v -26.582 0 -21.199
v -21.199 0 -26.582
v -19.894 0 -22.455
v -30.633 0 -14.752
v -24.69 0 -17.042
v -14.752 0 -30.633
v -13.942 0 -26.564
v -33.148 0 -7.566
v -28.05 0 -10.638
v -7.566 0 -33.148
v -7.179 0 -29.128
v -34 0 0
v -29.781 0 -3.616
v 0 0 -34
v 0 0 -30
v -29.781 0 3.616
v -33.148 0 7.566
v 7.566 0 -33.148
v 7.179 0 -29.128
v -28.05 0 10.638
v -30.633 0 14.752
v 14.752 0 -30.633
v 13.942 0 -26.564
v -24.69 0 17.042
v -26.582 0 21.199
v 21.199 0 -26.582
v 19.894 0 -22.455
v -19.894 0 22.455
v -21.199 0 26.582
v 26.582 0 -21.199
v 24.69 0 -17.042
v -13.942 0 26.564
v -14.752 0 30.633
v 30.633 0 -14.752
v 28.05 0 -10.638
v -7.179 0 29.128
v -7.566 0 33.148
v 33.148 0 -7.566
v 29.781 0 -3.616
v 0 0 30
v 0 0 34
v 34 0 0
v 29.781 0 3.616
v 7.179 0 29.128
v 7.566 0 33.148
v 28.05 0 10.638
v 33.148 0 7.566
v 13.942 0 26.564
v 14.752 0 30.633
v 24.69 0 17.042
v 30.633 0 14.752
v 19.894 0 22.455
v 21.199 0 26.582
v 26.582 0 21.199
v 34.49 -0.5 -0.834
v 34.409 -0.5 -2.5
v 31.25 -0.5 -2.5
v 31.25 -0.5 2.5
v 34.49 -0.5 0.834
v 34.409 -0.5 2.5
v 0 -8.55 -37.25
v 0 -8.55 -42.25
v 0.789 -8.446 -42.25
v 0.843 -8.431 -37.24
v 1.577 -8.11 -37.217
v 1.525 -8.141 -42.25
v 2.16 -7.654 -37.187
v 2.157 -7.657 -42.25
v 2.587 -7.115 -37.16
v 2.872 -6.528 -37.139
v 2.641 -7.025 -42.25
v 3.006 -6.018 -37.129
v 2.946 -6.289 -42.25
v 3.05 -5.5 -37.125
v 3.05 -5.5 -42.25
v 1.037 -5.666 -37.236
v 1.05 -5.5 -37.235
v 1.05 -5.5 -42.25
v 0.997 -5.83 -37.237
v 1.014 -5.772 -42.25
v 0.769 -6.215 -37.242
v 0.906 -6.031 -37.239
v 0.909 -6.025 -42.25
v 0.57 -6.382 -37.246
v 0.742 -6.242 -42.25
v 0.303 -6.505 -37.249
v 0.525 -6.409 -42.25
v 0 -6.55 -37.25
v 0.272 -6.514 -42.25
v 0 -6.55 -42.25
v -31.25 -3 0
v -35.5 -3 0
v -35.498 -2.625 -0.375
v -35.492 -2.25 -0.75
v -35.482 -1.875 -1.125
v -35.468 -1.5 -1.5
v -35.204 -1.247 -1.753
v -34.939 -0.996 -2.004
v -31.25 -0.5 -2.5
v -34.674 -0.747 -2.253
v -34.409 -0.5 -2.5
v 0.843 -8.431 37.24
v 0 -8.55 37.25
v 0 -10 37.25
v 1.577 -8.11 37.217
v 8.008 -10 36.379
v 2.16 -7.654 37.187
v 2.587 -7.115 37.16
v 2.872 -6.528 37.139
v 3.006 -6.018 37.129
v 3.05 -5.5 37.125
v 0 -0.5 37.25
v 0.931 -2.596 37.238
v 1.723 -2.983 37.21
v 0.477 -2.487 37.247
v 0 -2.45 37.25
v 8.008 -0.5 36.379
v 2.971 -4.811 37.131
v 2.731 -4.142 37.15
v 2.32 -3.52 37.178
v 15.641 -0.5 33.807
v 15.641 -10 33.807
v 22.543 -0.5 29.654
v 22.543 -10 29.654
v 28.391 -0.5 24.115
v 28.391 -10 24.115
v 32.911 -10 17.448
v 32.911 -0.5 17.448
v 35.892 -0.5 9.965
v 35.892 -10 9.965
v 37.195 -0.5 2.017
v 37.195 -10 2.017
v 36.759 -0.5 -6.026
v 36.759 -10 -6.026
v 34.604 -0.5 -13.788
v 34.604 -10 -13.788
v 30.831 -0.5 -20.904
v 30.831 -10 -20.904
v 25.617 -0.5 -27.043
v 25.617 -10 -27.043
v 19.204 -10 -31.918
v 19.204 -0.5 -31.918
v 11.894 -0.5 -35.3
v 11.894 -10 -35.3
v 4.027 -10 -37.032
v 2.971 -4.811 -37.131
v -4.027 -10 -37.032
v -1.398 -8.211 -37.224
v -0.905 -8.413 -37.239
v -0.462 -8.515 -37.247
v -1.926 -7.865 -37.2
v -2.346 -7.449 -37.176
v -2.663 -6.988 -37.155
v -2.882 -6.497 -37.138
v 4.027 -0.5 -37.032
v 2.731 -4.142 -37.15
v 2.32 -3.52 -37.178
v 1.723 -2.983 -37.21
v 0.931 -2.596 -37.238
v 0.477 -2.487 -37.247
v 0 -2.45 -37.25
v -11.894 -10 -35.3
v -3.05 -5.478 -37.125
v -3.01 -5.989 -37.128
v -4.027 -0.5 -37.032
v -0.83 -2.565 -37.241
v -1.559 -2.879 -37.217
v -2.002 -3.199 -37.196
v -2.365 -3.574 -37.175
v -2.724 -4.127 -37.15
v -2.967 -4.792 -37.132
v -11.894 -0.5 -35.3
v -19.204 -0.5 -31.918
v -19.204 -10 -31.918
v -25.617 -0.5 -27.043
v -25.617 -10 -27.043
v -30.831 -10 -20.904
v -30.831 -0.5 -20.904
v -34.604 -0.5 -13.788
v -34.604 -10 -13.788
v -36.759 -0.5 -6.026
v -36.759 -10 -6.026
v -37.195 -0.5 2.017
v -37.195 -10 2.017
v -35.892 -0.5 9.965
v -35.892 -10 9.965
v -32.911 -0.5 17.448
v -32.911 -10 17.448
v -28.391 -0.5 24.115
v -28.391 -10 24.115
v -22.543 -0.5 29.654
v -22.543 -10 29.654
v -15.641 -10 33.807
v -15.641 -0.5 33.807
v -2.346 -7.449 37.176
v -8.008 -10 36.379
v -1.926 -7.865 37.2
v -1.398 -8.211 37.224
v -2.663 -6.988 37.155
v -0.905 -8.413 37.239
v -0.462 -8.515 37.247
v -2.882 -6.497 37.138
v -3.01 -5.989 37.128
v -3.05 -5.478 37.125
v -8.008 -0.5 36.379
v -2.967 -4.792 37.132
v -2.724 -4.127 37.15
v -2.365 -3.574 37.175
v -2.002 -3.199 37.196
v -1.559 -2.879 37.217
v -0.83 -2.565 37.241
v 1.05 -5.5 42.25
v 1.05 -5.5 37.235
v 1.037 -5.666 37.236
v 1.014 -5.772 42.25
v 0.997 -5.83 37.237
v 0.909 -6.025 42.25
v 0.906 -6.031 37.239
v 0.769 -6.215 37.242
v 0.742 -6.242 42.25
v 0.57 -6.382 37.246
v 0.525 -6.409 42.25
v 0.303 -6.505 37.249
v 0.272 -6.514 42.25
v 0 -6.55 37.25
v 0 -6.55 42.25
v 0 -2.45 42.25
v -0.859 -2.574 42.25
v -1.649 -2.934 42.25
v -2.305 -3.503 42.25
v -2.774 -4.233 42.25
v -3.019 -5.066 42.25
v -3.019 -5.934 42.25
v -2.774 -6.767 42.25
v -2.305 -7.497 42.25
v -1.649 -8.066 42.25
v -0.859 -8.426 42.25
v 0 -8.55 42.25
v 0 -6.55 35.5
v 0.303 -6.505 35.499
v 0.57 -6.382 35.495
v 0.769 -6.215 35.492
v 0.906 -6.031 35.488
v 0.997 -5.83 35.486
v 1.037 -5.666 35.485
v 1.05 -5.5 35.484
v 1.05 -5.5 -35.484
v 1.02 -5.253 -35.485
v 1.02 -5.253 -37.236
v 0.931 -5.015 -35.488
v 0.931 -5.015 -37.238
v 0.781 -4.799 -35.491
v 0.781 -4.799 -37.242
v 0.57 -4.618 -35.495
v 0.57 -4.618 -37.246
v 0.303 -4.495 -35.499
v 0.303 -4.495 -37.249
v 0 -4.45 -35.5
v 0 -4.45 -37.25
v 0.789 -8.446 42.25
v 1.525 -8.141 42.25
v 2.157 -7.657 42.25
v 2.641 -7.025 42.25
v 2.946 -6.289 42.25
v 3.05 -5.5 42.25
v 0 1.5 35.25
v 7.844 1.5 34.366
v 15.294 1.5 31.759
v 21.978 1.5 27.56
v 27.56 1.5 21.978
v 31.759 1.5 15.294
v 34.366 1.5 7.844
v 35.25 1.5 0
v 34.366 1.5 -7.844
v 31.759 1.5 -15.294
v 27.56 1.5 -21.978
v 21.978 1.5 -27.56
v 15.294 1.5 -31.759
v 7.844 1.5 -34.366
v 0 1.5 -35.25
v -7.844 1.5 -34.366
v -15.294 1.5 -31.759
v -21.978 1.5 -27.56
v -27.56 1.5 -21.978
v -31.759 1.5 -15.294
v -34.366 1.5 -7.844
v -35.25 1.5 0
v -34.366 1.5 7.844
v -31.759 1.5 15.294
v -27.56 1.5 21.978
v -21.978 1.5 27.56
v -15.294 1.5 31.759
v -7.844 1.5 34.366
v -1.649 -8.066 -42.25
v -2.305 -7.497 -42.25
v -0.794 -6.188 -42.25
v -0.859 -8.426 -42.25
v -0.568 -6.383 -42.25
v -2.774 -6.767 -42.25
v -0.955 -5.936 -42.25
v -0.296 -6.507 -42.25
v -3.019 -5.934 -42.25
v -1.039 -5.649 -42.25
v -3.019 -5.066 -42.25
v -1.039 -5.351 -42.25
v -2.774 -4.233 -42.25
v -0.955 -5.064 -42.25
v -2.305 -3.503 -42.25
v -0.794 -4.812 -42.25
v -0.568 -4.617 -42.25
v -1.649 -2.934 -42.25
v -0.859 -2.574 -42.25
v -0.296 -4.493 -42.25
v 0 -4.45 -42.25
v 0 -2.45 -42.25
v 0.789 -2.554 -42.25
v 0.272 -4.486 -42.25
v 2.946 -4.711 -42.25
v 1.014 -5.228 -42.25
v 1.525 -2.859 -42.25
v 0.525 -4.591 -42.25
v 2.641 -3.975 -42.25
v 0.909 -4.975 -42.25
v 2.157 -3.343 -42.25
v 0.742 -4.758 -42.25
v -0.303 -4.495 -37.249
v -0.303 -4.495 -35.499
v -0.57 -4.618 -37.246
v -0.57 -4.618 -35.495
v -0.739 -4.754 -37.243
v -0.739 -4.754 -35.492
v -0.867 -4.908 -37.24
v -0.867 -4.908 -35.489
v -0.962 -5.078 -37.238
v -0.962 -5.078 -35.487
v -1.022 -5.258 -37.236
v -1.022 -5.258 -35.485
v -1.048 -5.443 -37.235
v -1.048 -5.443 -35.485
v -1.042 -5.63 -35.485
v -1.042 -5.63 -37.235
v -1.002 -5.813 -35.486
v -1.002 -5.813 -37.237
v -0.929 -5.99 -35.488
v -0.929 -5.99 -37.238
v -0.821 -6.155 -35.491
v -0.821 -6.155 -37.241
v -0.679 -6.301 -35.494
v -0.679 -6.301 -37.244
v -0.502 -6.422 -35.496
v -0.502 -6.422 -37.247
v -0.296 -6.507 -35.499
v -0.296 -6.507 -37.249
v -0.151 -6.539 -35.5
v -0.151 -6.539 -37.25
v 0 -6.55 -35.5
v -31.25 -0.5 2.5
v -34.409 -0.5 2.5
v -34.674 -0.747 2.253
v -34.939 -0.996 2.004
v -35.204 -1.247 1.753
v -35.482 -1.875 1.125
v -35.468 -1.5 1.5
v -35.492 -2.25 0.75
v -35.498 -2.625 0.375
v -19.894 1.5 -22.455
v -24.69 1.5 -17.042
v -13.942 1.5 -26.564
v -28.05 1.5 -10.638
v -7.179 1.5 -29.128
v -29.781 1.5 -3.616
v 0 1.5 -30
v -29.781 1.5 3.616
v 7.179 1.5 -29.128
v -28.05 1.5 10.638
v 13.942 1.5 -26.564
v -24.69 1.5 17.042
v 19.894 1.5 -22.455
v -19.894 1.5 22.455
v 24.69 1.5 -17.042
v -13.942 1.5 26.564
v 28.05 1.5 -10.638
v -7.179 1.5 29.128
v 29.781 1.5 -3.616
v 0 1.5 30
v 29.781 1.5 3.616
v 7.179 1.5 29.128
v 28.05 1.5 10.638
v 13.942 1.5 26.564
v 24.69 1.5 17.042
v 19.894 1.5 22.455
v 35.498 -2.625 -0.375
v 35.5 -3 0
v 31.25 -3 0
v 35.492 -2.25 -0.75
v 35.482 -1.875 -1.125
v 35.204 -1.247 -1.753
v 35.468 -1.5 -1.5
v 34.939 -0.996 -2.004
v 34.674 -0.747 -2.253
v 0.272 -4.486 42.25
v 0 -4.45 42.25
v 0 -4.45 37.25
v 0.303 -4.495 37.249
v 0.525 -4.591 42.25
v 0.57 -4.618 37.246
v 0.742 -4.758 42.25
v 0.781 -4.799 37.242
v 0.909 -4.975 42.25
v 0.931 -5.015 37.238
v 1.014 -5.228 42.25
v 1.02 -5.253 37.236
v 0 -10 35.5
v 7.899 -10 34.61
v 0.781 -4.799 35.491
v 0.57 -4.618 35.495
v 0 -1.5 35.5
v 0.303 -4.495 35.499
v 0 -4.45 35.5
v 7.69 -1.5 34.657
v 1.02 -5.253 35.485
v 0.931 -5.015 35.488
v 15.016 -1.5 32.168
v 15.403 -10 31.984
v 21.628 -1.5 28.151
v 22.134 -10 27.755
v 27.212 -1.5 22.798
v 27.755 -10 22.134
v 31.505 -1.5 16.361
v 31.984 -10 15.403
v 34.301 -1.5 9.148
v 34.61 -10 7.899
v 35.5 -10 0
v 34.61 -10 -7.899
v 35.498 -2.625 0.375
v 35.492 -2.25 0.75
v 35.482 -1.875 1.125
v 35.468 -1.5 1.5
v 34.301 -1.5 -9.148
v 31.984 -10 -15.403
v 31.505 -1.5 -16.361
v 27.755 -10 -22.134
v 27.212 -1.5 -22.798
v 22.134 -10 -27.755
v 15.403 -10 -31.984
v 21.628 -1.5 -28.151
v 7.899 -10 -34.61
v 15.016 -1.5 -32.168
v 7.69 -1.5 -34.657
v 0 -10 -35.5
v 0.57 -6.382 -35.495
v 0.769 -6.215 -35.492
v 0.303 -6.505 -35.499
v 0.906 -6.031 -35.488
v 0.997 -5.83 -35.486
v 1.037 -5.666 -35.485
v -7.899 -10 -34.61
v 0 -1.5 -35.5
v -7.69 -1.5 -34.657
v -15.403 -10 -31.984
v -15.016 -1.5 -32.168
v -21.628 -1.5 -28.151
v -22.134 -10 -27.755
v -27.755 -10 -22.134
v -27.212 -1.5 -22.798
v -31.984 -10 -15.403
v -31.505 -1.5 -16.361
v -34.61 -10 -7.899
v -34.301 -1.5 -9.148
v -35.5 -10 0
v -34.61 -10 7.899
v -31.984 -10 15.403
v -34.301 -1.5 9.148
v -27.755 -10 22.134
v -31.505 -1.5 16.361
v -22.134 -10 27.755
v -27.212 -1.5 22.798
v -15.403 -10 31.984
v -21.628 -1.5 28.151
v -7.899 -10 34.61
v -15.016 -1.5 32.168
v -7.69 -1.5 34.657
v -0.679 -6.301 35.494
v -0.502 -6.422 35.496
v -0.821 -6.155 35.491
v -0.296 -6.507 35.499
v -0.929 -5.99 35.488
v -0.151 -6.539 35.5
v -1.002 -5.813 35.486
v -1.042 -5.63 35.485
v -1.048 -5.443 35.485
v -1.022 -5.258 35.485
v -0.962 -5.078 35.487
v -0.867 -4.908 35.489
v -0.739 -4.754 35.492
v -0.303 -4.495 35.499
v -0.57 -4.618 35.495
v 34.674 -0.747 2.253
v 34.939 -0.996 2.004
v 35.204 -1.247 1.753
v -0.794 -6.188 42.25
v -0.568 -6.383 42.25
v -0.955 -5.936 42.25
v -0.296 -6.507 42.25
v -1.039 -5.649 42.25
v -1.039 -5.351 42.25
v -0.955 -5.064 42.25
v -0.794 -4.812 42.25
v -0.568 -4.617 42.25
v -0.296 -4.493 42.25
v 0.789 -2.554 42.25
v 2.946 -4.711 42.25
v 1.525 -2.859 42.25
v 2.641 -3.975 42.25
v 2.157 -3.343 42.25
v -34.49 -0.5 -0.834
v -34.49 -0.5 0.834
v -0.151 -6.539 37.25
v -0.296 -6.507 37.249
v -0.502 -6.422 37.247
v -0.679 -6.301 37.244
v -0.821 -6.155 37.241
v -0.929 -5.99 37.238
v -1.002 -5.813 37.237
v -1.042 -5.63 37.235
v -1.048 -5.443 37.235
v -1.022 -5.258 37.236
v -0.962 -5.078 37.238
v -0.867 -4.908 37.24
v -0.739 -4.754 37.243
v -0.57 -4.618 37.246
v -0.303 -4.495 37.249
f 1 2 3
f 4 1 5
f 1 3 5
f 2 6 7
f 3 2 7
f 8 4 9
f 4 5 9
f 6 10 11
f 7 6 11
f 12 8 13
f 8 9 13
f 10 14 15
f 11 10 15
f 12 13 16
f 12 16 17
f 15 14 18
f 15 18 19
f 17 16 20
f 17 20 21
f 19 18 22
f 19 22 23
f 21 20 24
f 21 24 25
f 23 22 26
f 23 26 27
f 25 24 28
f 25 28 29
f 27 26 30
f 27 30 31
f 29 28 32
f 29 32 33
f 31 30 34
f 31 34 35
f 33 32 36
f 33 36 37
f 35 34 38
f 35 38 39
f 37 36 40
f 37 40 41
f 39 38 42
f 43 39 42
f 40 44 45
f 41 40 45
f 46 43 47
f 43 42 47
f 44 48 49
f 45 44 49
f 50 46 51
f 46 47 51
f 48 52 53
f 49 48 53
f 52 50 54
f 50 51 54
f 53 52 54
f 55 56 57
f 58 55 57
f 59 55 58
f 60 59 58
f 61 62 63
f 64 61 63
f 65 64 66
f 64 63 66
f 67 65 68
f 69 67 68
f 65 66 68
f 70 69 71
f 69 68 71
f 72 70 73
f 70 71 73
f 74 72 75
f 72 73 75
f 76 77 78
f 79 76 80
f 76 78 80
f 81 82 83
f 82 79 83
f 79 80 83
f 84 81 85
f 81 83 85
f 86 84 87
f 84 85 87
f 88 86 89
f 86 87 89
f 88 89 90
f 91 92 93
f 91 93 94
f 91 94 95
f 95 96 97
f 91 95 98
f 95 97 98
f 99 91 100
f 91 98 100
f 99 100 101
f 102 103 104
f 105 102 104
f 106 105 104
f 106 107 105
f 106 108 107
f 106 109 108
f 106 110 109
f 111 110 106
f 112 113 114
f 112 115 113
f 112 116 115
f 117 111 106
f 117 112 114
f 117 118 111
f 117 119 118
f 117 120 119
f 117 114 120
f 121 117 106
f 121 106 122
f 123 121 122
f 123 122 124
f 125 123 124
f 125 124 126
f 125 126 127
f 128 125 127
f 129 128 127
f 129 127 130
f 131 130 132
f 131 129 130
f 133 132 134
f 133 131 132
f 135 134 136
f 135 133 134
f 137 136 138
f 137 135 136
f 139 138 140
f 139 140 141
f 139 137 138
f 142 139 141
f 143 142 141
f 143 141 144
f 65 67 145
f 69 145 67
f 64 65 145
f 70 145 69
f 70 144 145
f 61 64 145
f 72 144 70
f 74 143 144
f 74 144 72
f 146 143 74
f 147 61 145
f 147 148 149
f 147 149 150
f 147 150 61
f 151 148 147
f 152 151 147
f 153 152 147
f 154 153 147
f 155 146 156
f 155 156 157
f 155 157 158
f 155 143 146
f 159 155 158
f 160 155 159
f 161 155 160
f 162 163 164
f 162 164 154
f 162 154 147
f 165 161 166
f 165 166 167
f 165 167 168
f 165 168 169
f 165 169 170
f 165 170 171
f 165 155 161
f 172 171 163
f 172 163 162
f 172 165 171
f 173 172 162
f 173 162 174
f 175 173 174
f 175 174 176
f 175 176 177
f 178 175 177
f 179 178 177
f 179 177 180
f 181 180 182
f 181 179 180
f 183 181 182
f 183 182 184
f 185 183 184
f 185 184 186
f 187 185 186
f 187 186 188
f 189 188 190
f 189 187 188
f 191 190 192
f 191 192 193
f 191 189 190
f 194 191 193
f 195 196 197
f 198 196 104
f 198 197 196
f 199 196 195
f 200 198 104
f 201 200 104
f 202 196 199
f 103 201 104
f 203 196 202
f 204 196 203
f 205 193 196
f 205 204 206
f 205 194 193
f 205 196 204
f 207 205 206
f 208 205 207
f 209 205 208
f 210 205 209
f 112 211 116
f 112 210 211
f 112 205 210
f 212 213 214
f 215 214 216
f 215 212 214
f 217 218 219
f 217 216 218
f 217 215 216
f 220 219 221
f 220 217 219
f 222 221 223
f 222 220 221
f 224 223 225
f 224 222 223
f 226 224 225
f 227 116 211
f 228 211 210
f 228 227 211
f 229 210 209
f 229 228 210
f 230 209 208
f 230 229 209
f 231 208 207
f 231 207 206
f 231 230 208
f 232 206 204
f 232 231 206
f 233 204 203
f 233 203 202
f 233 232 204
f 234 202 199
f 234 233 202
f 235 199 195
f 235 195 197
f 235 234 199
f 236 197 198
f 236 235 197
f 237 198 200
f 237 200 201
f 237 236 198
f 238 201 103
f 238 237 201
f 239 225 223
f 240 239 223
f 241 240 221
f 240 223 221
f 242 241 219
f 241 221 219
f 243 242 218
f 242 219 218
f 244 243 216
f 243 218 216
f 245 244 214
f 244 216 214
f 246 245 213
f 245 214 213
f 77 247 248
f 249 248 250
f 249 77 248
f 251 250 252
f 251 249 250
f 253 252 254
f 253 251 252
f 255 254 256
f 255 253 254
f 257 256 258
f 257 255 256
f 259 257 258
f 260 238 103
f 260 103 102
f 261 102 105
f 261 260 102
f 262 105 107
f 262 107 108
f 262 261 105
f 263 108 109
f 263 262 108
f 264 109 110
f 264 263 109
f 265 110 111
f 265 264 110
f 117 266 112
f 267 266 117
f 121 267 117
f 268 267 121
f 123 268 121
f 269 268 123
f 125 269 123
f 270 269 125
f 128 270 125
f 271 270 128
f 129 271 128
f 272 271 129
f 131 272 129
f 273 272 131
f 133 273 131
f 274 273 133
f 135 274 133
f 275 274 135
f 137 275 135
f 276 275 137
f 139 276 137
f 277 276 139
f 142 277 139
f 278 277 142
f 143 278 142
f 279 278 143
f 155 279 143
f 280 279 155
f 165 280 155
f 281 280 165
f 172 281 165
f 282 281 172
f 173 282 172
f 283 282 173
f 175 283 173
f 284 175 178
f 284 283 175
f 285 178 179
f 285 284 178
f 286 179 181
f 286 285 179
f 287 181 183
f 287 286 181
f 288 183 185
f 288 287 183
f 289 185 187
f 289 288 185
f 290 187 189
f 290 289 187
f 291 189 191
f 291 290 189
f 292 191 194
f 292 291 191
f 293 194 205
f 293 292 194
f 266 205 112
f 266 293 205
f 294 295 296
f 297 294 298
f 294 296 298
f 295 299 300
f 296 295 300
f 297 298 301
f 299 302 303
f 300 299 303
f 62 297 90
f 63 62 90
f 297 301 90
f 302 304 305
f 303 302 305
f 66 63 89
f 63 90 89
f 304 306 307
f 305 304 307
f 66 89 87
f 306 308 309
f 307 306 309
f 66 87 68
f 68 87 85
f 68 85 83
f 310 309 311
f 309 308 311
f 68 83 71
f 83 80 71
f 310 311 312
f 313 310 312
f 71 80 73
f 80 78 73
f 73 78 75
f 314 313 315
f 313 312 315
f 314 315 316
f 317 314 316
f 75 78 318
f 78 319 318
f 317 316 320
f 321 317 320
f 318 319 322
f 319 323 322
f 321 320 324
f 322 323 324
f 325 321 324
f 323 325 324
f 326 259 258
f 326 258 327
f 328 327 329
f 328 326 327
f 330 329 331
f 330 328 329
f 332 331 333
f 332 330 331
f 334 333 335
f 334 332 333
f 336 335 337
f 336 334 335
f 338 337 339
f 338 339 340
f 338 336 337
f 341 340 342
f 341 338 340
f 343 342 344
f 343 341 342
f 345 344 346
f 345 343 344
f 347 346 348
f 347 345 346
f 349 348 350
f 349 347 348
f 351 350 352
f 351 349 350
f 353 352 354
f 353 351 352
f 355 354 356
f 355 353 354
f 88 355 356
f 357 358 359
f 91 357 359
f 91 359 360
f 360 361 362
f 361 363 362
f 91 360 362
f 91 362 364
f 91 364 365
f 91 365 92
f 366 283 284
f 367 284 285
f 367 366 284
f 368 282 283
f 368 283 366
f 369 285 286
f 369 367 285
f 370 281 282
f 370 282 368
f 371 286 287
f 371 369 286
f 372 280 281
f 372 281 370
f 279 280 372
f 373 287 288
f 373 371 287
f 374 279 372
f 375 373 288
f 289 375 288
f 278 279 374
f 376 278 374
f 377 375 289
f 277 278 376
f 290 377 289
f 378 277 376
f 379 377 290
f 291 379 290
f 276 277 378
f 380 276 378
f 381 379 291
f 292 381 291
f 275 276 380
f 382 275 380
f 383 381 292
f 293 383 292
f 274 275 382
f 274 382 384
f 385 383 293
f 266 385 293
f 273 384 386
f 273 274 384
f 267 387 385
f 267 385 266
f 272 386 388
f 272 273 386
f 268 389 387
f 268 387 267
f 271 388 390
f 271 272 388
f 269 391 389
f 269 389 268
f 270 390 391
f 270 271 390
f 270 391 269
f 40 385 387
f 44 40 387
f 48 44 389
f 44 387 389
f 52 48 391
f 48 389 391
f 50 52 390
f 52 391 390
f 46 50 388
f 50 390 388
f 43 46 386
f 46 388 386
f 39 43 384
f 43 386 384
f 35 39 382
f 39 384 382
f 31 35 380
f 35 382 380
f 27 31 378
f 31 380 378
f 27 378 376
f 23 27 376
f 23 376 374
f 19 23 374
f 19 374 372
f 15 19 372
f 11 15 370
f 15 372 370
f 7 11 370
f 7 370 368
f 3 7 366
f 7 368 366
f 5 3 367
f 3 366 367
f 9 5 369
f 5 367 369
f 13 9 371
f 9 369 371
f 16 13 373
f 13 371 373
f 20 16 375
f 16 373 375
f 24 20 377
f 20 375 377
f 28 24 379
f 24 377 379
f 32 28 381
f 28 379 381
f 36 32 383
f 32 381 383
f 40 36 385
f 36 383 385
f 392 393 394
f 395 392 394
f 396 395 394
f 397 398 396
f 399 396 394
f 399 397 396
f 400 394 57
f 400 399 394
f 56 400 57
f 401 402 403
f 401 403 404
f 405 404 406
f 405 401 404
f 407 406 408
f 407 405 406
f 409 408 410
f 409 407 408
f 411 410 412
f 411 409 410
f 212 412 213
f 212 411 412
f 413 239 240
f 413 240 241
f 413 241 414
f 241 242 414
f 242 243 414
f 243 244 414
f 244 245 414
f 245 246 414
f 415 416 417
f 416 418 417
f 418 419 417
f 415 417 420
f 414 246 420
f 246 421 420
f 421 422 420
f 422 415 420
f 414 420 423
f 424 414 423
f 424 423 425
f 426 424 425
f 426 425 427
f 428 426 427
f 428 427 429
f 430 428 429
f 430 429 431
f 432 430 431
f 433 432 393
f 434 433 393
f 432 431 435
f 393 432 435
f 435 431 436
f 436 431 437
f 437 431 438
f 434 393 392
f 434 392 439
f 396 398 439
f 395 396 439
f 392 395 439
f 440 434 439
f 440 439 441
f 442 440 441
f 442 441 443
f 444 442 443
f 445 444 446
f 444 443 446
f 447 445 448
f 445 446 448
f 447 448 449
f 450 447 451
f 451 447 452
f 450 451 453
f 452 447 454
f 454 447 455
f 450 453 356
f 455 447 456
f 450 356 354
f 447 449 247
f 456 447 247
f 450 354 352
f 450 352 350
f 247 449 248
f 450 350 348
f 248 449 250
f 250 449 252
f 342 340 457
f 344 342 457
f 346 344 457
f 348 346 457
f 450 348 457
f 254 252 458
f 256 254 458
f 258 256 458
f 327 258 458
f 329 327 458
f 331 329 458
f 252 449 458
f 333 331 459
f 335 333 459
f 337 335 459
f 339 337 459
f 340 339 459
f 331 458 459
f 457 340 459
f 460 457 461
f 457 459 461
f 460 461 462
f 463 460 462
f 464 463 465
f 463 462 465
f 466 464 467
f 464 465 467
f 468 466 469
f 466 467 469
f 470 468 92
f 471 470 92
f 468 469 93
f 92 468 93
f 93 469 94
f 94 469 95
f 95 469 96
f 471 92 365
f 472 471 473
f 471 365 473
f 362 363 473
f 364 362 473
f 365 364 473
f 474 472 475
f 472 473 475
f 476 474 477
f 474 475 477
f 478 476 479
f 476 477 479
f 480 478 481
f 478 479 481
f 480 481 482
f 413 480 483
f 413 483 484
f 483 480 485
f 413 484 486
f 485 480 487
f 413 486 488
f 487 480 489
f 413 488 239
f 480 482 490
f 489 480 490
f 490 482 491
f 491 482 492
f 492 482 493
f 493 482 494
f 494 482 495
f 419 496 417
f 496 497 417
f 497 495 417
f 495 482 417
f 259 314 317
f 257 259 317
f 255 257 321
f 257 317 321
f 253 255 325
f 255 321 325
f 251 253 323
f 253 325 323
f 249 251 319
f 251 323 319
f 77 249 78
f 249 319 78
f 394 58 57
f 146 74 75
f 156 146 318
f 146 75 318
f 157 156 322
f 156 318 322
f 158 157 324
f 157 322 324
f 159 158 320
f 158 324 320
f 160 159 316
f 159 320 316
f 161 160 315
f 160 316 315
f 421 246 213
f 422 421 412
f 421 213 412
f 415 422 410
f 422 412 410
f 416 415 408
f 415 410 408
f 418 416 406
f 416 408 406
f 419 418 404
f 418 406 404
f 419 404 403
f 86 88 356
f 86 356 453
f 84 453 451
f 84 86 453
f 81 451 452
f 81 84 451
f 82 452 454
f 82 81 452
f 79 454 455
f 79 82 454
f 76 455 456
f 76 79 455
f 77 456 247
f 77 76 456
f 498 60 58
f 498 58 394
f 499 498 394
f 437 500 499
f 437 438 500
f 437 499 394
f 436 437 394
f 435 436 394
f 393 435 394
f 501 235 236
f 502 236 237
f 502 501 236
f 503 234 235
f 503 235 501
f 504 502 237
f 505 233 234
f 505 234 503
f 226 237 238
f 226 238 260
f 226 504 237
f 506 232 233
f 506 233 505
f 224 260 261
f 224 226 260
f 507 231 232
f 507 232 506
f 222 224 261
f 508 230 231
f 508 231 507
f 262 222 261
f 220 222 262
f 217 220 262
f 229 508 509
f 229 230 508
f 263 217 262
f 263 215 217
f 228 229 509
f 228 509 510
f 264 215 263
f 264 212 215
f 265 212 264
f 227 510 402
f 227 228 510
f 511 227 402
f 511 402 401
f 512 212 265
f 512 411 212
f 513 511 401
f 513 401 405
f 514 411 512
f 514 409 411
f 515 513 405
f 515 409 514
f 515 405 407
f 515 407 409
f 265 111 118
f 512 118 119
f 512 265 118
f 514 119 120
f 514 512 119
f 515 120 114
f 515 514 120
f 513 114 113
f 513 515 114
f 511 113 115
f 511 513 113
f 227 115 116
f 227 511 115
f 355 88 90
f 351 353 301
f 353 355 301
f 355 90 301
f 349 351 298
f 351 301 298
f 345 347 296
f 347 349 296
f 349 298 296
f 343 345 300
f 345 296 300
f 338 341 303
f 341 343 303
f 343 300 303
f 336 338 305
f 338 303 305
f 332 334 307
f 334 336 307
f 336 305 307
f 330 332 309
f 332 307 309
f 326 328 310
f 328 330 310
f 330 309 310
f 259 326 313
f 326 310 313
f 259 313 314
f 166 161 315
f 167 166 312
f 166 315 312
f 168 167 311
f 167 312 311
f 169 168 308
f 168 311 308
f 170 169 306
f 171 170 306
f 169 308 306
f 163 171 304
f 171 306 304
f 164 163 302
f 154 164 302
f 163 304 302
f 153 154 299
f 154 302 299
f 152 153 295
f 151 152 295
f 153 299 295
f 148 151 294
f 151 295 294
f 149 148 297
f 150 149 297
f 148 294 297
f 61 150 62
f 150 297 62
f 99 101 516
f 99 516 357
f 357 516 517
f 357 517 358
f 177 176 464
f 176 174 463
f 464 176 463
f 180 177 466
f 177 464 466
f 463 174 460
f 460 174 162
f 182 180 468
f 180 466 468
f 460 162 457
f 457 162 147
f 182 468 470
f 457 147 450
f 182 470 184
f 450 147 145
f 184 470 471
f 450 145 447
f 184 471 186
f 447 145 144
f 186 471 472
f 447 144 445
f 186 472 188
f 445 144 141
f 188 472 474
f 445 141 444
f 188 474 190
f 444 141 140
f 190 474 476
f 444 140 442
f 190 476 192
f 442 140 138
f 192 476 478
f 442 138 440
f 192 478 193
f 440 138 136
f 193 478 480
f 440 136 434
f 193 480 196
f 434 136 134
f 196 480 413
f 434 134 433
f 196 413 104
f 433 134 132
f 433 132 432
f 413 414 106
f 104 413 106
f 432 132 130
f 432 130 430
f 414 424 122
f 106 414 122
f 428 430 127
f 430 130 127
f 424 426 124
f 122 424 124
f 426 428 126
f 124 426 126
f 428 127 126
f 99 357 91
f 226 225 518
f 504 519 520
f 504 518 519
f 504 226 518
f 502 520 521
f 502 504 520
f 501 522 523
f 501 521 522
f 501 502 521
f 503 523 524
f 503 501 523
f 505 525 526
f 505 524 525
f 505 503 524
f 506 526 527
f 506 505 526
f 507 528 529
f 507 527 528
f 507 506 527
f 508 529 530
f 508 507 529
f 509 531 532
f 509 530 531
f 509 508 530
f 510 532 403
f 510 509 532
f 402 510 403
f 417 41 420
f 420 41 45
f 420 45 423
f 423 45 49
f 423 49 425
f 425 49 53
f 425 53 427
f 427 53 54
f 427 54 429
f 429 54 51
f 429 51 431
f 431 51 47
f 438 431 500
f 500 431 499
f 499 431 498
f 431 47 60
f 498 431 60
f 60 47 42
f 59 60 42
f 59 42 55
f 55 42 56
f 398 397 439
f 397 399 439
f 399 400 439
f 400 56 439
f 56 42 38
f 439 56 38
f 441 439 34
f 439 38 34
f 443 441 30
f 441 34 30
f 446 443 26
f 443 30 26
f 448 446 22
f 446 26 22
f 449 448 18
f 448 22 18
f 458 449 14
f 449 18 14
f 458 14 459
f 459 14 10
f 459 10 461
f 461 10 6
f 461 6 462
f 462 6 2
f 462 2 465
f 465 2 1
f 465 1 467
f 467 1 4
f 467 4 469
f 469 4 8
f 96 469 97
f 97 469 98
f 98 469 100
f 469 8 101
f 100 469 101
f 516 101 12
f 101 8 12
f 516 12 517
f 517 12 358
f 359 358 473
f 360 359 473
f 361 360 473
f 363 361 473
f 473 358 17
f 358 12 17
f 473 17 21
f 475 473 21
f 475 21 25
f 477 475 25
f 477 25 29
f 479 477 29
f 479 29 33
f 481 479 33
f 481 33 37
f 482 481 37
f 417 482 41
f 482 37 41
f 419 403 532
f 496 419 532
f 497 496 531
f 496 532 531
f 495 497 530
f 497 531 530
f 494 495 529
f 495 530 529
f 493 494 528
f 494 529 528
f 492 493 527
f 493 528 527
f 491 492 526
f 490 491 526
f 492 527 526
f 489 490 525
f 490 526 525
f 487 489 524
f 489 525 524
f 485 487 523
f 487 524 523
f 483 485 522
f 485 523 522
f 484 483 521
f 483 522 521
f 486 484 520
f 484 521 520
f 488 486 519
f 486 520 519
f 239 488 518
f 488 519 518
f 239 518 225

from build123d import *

# Parameters (mm, degrees)
SKETCH1_R           = 37.25
SKETCH1_R_2         = 35.5
BOSS_EXTRUDE1_DEPTH = 10
BOSS_EXTRUDE2_START = 1.5
SKETCH1_2_R         = 37.25
SKETCH1_2_R_2       = 30
BOSS_EXTRUDE2_DEPTH = 1.5
CHAMFER1_SIZE       = 1.5
CHAMFER2_SIZE       = 2
SKETCH2_R           = 1.05
CUT_EXTRUDE1_DEPTH  = 10
BOSS_EXTRUDE4_START = 5
SKETCH2_3_R         = 3.05
SKETCH2_3_R_2       = 1.05
BOSS_EXTRUDE4_DEPTH = 6
BOSS_EXTRUDE6_START = -1
BOSS_EXTRUDE6_DEPTH = 5


with BuildPart() as part:
    # Sketch1 → Boss-Extrude1 (new body)
    with BuildSketch(Plane(origin=(0, 0, 0), x_dir=(1, 0, 0), z_dir=(0, 1, 0))):
        Circle(SKETCH1_R)
        Circle(SKETCH1_R_2, mode=Mode.SUBTRACT)
    extrude(amount=-BOSS_EXTRUDE1_DEPTH)

    # Sketch1<2> → Boss-Extrude2 (add)
    with BuildSketch(Plane(origin=(0, 0, 0), x_dir=(1, 0, 0), z_dir=(0, 1, 0)).offset(BOSS_EXTRUDE2_START)):
        Circle(SKETCH1_2_R)
        Circle(SKETCH1_2_R_2, mode=Mode.SUBTRACT)
    extrude(amount=-BOSS_EXTRUDE2_DEPTH)

    # Chamfer1
    chamfer1_edges = [part.edges().sort_by_distance(p)[0] for p in [
        (-35.5, 0, 0),
    ]]
    chamfer(chamfer1_edges, length=CHAMFER1_SIZE)

    # Chamfer2
    chamfer2_edges = [part.edges().sort_by_distance(p)[0] for p in [
        (-37.25, 1.5, 0),
    ]]
    chamfer(chamfer2_edges, length=CHAMFER2_SIZE)

    # Sketch2 → Cut-Extrude1 (cut)
    with BuildSketch(Plane.XY.offset(37.25)):
        with Locations((0, -5.5)):
            Circle(SKETCH2_R)
    cut_extrude1 = extrude(amount=-CUT_EXTRUDE1_DEPTH, mode=Mode.SUBTRACT)

    # Sketch2<3> → Boss-Extrude4 (add)
    with BuildSketch(Plane.XY.offset(37.25).offset(BOSS_EXTRUDE4_START)):
        with Locations((0, -5.5)):
            Circle(SKETCH2_3_R)
        with Locations((0, -5.5)):
            Circle(SKETCH2_3_R_2, mode=Mode.SUBTRACT)
    boss_extrude4 = extrude(amount=-BOSS_EXTRUDE4_DEPTH)

    # Mirror1: Cut-Extrude1, Boss-Extrude4 across plane
    add(cut_extrude1.mirror(Plane.XY), mode=Mode.SUBTRACT)
    add(boss_extrude4.mirror(Plane.XY))

    # tirangle → Boss-Extrude6 (add)
    with BuildSketch(Plane(origin=(37.25, 0, 0), x_dir=(0, 0, -1), z_dir=(1, 0, 0)).offset(BOSS_EXTRUDE6_START)):
        Polygon((2.5, -0.5), (-2.5, -0.5), (0, -3), align=None)
    boss_extrude6 = extrude(amount=-BOSS_EXTRUDE6_DEPTH)

    # Mirror2: Boss-Extrude6 across plane
    add(boss_extrude6.mirror(Plane(origin=(0, 0, 0), x_dir=(0, 0, 1), z_dir=(1, 0, 0))))


solid = part.part
